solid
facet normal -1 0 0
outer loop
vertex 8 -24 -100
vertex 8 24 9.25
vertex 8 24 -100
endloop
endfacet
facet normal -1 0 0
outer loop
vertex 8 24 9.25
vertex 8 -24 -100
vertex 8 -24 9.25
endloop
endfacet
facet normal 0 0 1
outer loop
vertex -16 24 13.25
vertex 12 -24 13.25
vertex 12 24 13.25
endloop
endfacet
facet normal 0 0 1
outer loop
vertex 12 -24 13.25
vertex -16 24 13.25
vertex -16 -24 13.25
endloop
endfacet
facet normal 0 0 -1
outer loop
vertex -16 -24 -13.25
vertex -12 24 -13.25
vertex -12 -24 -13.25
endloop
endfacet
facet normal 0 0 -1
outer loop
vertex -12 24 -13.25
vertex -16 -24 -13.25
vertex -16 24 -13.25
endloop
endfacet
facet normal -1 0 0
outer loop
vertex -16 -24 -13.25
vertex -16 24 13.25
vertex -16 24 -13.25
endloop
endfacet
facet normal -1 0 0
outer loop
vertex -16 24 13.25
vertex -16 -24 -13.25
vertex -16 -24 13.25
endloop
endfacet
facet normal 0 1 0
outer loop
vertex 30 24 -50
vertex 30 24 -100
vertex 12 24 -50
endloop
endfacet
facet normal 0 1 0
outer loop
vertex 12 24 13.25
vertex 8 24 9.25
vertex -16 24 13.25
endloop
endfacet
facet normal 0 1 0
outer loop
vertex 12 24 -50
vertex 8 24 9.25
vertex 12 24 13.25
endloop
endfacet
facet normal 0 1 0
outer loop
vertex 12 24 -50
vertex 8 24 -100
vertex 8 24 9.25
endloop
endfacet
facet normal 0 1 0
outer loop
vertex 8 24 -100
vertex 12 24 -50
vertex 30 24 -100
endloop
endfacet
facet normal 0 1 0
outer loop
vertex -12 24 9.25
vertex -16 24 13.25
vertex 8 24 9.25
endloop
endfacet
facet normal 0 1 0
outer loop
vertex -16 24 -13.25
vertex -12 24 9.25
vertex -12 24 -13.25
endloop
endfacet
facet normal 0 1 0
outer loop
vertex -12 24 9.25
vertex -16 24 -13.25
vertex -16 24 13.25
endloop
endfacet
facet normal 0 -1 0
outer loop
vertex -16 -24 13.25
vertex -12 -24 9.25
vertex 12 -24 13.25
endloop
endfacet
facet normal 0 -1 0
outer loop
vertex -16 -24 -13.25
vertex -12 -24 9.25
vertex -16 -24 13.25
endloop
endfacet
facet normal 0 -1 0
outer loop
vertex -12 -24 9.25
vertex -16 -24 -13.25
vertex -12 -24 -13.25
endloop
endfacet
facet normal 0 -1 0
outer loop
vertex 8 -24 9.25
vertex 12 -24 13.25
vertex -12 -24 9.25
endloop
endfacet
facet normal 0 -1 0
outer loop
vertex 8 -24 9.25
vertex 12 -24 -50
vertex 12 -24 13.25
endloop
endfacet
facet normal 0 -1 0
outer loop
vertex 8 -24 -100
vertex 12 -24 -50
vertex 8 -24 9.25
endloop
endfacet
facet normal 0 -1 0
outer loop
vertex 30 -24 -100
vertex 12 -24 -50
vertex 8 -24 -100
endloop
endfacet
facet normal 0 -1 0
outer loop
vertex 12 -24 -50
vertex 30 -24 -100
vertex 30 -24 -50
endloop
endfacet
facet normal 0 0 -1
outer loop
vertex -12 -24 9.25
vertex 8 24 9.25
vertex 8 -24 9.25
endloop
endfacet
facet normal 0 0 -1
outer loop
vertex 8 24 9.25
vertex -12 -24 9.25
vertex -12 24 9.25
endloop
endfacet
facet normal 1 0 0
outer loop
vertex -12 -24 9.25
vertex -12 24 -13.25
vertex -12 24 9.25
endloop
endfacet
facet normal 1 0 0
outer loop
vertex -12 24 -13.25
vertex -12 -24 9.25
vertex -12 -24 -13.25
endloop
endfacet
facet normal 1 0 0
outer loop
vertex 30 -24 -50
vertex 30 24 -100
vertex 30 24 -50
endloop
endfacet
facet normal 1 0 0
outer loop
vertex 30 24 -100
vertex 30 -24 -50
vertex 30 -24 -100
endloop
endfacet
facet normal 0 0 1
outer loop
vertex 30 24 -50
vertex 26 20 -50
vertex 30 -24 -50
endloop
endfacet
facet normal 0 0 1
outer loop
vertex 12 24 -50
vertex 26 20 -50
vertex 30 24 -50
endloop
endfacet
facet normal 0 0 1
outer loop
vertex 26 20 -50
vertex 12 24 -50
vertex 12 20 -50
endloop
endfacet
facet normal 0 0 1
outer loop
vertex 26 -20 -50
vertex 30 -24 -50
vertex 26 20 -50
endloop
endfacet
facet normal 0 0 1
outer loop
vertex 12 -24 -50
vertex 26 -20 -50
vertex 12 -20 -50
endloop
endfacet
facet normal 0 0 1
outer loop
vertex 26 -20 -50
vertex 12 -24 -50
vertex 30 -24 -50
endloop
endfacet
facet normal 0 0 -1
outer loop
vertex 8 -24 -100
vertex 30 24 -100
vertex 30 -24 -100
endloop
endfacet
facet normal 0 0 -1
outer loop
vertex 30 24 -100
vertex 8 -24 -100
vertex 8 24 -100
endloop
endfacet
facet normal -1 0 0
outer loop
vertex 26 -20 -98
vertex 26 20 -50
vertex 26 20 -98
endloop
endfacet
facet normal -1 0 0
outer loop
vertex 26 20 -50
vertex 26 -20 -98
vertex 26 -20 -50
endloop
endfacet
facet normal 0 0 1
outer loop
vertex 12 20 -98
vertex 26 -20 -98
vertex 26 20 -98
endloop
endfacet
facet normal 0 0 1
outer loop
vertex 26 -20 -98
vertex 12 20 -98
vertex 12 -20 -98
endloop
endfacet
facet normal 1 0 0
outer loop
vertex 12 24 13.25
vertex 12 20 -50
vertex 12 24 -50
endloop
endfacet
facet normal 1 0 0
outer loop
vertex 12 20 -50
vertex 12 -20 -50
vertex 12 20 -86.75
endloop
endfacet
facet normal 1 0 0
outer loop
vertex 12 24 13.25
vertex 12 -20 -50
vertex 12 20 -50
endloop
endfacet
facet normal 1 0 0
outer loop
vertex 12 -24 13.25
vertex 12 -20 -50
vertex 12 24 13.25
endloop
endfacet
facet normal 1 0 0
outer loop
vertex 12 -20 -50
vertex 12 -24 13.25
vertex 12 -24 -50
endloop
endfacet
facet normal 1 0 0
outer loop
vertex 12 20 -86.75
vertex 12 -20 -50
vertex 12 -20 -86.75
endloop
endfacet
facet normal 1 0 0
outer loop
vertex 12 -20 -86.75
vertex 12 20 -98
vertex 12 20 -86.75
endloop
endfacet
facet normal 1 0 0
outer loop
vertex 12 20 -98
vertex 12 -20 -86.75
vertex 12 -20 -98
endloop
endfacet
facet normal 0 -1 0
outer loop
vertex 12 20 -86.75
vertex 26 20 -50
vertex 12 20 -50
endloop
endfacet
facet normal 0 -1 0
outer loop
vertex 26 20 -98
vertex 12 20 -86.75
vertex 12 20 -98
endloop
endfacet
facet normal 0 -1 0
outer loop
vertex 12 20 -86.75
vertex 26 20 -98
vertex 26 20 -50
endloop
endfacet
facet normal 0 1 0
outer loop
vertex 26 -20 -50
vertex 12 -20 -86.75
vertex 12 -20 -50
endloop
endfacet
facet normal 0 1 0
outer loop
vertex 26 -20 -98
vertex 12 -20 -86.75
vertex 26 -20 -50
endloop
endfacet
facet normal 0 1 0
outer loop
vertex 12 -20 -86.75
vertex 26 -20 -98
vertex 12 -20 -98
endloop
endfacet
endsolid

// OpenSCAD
bed_frame_width=20;
bed_frame_depth=22.5;

holder_width=48;
holder_height=100;
holder_thickness=4;

remote_width=40;
remote_depth=14;

union() {
  // bed frame hanger
  difference() {
    translate([-holder_thickness/2-2, 0, 0])
      cube([bed_frame_width+holder_thickness, holder_width, bed_frame_depth+holder_thickness], center=true);
    translate([-2, 0, -holder_thickness/2])
      cube([bed_frame_width, holder_width, bed_frame_depth], center=true);
  }

  // long connection
  translate([bed_frame_width/2, 0, -holder_height/2+bed_frame_depth/2+holder_thickness/2])
    cube([holder_thickness, holder_width, holder_height], center=true);

  // remote box
  difference() {
    translate([-holder_thickness+remote_depth-2, -holder_width/2, -holder_height])
      cube([remote_depth+holder_thickness*2, holder_width, 50]);
    translate([-holder_thickness+remote_depth+holder_thickness-2, -remote_width/2, -holder_height+holder_thickness/2])
      cube([remote_depth, remote_width, 50]);
  }
}
